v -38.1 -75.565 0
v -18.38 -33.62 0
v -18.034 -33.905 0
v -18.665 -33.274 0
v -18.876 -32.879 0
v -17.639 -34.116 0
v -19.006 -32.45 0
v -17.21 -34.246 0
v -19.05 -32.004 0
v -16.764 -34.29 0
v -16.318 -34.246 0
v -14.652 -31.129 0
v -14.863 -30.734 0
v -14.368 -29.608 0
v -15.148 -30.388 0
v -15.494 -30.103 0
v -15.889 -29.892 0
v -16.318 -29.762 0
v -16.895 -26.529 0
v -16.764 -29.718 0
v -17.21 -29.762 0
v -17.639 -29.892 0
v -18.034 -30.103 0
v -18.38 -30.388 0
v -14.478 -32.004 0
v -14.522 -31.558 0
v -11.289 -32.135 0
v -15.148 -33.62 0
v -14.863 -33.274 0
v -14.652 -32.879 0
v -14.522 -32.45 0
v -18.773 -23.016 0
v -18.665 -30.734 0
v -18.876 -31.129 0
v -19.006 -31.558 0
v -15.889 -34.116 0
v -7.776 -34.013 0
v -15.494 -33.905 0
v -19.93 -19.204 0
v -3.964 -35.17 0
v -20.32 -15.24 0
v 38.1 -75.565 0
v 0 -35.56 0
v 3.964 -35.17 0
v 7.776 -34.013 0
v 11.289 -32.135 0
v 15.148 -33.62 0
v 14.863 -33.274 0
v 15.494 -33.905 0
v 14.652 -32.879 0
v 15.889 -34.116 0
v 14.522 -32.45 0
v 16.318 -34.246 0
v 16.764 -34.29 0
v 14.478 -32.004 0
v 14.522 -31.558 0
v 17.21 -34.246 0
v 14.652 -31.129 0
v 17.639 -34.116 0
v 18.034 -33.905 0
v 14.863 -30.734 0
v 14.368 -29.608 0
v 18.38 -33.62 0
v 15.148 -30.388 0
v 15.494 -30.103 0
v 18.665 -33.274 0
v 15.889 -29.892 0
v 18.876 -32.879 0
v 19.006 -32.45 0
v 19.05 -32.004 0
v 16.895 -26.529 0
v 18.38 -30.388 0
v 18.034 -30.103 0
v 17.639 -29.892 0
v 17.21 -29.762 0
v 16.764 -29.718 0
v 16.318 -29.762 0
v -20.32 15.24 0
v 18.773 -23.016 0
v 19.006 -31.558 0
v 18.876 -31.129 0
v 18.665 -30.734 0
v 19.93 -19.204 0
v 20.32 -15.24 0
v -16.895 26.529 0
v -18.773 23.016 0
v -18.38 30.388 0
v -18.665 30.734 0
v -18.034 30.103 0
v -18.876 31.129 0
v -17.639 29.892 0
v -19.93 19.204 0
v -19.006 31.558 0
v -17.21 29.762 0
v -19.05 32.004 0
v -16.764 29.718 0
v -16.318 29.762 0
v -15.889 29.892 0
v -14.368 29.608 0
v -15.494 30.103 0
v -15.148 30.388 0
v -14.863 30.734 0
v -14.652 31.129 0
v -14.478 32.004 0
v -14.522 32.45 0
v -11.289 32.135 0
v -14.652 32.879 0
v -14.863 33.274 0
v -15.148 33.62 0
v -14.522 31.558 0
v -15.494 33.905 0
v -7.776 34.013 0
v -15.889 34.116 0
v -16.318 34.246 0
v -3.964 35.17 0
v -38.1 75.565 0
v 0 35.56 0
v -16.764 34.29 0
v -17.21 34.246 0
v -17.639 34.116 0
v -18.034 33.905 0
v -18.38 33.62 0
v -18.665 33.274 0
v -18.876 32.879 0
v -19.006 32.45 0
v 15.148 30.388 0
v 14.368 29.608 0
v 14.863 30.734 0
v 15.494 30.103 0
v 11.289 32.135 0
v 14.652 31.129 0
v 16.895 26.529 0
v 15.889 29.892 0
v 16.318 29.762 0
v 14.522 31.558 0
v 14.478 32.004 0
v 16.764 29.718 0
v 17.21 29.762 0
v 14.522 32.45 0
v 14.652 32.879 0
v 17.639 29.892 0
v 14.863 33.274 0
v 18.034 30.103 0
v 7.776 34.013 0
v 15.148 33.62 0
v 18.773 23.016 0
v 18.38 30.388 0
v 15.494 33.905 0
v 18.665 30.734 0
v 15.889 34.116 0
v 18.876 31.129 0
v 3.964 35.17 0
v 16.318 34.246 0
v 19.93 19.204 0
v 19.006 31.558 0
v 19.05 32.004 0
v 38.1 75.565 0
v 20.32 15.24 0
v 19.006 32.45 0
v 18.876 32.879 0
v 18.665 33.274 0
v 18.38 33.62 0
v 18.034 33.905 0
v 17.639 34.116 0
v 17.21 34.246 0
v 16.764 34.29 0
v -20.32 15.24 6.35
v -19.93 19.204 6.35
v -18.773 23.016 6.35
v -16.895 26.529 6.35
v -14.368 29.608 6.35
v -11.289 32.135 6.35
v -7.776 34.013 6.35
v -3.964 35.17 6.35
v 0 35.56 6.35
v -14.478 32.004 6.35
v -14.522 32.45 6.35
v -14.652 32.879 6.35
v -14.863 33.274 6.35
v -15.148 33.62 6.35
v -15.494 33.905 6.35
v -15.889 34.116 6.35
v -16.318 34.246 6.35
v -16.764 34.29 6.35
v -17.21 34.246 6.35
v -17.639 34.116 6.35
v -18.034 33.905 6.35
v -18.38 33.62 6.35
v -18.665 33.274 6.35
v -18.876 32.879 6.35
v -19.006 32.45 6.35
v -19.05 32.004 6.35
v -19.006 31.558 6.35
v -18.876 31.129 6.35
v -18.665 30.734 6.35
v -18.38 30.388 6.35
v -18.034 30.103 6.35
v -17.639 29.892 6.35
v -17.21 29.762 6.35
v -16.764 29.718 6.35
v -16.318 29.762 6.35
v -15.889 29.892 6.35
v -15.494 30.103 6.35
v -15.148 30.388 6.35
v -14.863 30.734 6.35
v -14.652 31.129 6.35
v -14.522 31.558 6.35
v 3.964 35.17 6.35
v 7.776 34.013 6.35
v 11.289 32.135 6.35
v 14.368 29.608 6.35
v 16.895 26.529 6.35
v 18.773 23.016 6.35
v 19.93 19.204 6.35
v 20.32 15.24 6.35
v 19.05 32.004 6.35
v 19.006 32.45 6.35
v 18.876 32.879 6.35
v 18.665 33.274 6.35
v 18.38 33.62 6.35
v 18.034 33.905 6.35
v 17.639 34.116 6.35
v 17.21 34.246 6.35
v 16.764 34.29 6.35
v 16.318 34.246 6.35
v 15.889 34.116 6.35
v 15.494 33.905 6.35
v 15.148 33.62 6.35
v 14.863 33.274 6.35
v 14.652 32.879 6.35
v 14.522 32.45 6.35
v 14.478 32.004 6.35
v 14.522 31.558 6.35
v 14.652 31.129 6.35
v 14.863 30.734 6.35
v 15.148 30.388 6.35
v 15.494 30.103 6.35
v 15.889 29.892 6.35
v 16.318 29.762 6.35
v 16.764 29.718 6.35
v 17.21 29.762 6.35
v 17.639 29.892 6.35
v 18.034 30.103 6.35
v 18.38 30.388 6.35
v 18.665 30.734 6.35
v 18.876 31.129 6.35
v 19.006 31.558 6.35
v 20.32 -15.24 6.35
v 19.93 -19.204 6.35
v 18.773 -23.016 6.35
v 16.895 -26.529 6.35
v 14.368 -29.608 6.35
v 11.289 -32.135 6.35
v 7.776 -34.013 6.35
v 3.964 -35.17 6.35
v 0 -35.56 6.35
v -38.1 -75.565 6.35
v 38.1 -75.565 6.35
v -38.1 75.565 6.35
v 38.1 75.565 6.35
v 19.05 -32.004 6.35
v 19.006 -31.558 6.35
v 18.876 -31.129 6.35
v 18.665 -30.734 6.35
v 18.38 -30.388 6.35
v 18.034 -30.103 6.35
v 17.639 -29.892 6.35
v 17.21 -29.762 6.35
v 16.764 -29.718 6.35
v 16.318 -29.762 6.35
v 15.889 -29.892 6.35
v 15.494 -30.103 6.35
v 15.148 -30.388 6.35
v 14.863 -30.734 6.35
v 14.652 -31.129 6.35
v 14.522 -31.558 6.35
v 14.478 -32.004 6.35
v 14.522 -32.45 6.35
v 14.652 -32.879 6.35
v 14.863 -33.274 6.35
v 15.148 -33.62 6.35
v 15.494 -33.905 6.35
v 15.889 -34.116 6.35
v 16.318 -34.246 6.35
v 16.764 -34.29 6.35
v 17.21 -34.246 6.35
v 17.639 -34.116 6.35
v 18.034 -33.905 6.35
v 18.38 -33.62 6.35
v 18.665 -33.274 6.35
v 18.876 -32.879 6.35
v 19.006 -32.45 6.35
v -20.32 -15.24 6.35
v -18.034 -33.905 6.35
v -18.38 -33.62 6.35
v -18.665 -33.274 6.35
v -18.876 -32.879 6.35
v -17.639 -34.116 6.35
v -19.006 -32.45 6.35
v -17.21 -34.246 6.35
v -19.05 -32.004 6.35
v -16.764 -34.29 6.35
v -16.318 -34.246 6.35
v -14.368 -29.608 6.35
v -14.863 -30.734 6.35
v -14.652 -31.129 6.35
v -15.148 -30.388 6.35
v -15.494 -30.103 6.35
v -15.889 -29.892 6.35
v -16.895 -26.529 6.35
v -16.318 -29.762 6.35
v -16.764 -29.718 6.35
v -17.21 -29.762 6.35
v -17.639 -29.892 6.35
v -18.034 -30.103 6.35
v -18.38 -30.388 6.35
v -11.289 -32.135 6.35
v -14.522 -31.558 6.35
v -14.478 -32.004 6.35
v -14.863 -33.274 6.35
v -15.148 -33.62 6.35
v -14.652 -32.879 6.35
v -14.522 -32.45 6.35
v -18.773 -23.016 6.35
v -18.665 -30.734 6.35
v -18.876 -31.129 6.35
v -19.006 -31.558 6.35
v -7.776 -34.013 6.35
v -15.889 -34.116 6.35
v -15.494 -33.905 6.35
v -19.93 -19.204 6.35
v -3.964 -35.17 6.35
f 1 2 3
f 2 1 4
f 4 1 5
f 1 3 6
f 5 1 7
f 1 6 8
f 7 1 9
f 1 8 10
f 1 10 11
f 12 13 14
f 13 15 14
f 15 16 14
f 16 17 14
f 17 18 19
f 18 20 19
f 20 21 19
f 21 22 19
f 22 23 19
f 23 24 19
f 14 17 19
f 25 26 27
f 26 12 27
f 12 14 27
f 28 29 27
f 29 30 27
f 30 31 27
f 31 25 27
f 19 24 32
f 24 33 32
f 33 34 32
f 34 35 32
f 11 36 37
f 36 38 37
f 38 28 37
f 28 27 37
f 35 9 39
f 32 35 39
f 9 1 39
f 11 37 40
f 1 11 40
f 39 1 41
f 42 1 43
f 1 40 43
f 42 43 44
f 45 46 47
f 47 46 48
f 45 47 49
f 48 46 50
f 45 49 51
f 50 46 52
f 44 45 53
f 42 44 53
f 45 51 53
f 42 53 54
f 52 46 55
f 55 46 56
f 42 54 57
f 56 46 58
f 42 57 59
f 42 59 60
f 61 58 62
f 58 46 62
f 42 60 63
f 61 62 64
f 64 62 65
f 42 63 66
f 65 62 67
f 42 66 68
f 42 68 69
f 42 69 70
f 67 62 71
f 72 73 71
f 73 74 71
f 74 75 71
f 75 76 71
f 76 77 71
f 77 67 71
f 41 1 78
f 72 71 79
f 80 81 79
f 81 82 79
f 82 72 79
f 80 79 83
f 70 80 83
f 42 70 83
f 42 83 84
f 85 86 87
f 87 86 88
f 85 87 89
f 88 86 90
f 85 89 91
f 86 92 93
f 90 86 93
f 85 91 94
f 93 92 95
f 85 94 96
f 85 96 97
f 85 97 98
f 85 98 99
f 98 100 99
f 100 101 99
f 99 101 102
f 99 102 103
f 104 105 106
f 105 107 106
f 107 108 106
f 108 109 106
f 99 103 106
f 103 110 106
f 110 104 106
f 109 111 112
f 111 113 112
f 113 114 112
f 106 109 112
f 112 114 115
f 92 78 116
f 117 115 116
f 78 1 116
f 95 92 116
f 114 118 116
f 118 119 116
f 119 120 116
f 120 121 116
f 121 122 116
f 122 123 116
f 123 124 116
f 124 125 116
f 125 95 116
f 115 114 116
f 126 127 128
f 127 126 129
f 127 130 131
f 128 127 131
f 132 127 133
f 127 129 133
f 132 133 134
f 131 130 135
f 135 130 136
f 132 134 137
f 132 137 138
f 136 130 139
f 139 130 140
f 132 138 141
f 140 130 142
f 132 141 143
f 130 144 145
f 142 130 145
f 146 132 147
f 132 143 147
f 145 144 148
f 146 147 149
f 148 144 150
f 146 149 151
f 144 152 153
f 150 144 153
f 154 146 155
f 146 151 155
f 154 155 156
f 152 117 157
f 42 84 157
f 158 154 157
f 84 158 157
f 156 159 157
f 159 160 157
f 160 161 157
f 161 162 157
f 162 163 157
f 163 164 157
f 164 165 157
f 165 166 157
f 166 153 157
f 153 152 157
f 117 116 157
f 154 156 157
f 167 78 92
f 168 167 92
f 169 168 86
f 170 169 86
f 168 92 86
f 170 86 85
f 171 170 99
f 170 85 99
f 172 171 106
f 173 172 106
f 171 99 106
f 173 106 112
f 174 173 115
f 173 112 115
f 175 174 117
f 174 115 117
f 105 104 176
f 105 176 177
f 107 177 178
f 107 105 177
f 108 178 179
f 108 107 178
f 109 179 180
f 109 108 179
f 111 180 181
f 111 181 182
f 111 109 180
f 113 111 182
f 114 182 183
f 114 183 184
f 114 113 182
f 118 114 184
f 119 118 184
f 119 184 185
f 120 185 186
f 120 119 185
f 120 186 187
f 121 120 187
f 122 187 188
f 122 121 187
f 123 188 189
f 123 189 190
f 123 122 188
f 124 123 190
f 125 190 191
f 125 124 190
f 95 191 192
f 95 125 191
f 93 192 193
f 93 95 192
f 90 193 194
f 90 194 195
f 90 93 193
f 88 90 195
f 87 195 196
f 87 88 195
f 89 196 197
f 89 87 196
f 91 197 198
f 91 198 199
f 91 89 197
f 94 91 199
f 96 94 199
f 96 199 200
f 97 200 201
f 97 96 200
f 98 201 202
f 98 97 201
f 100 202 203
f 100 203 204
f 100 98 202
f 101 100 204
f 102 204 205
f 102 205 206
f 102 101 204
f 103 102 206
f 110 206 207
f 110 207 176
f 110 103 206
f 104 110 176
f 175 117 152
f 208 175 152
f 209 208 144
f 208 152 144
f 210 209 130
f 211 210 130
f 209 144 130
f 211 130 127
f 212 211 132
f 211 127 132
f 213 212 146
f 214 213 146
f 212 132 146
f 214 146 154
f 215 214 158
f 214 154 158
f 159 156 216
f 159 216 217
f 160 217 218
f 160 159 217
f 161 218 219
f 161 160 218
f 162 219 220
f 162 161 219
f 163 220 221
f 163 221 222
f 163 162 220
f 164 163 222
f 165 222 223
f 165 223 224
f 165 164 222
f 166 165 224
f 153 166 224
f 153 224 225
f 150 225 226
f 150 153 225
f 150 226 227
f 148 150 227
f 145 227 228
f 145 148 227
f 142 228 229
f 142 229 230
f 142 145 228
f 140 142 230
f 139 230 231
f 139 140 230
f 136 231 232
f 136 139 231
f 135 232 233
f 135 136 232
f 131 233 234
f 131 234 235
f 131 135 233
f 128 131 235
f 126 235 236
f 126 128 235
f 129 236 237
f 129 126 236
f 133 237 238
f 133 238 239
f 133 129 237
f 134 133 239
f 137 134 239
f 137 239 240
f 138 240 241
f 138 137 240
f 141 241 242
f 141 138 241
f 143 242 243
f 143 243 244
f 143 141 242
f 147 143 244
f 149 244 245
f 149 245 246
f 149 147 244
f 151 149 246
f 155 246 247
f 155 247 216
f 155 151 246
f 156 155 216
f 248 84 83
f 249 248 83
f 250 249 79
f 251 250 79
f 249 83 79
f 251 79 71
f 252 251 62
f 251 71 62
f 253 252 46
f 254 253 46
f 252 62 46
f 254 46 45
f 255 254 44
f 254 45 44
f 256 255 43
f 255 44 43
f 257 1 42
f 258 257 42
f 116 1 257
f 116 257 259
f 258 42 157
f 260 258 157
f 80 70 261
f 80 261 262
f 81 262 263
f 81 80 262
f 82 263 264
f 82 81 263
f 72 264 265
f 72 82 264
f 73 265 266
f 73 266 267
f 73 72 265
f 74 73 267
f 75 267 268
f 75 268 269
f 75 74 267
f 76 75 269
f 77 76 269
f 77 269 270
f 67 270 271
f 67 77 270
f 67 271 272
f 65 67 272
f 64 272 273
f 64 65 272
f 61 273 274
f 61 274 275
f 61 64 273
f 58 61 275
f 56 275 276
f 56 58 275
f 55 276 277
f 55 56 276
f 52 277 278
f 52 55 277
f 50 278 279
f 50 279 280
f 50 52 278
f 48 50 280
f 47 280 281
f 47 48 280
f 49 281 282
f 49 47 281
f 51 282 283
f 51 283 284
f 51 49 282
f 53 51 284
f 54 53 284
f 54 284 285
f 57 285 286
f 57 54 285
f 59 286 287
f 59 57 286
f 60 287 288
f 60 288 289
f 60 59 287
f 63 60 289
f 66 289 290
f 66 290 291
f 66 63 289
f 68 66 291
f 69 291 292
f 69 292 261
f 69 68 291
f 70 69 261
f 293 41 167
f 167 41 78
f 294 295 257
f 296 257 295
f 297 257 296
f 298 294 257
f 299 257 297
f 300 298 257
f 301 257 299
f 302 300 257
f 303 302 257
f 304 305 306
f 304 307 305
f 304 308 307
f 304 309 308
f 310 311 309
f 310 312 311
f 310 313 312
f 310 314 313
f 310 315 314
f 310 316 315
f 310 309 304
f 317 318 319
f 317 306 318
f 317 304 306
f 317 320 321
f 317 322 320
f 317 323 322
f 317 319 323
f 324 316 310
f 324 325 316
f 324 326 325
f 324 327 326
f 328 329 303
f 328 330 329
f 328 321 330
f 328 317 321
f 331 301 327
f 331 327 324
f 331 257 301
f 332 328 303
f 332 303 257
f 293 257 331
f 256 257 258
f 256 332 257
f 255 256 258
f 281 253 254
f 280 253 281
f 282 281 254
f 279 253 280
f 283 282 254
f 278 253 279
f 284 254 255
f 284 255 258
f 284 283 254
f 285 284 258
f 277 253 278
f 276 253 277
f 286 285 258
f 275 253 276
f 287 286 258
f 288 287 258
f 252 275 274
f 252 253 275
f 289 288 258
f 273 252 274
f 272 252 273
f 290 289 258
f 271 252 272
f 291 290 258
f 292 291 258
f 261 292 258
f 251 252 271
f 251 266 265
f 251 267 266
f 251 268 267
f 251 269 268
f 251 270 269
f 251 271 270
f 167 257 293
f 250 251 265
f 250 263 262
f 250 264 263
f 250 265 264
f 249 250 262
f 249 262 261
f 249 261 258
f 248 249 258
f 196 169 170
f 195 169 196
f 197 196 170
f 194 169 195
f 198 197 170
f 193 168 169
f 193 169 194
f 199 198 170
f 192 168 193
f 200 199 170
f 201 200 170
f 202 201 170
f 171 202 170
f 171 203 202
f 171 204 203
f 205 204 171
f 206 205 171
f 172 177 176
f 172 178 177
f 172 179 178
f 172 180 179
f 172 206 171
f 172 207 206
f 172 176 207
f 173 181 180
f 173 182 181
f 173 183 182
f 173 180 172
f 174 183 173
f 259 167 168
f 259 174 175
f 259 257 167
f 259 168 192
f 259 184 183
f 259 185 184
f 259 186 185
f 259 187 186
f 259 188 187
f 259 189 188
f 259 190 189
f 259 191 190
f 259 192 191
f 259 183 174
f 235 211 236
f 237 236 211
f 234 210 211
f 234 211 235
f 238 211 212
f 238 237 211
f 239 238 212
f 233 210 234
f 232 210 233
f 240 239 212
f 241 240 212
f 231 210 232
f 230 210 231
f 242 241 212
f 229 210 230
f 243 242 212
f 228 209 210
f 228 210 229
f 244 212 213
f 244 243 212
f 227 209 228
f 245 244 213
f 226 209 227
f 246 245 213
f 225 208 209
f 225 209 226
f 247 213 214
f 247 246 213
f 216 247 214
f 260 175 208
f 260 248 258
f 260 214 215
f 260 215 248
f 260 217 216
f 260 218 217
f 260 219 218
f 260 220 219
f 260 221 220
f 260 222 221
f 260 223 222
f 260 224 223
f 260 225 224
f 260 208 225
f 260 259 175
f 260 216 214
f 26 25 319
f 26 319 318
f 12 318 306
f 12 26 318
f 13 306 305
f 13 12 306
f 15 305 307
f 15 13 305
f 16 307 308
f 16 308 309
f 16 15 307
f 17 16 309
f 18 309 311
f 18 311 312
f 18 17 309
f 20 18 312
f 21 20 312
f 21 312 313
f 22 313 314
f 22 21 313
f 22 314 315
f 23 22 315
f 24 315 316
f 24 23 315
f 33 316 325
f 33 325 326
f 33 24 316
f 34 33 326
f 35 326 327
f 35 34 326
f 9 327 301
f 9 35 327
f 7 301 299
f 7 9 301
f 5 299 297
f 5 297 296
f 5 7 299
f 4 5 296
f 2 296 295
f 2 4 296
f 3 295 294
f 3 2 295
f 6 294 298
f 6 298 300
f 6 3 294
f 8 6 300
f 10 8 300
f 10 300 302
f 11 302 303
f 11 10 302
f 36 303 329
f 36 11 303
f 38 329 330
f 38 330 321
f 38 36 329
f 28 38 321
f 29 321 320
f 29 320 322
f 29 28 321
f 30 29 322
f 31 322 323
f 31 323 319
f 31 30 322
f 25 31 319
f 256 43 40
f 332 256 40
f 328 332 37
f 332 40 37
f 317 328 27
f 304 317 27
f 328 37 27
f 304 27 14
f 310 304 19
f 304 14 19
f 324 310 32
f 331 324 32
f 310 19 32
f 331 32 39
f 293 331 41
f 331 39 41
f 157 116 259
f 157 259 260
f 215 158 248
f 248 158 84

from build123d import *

# Parameters (mm, degrees)
F0_W     = 76.2
F0_H     = 151.13
F0_R     = 2.286
F1_DEPTH = 6.35


with BuildPart() as f1:
    # F0 (on Top) → F1 (new body)
    with BuildSketch(Plane.XY):
        Rectangle(F0_W, F0_H)
        Polygon((0, 35.56), (20.32, 35.56), (20.32, 15.24), (20.32, -15.24), (20.32, -35.56), (0, -35.56), (-20.32, -35.56), (-20.32, -15.24), (-20.32, 15.24), (-20.32, 35.56), align=None, mode=Mode.SUBTRACT)
        with BuildLine():
            ThreePointArc((0, -35.56), (-14.36841, -29.60841), (-20.32, -15.24))
            Line((-20.32, -15.24), (-20.32, -35.56))
            Line((-20.32, -35.56), (0, -35.56))
        make_face()
        with Locations((-16.764, -32.004)):
            Circle(F0_R, mode=Mode.SUBTRACT)
        with BuildLine():
            Line((20.32, -35.56), (20.32, -15.24))
            ThreePointArc((20.32, -15.24), (14.36841, -29.60841), (0, -35.56))
            Line((0, -35.56), (20.32, -35.56))
        make_face()
        with Locations((16.764, -32.004)):
            Circle(F0_R, mode=Mode.SUBTRACT)
        with BuildLine():
            ThreePointArc((-20.32, 15.24), (-14.36841, 29.60841), (0, 35.56))
            Line((0, 35.56), (-20.32, 35.56))
            Line((-20.32, 35.56), (-20.32, 15.24))
        make_face()
        with Locations((-16.764, 32.004)):
            Circle(F0_R, mode=Mode.SUBTRACT)
        with BuildLine():
            Line((20.32, 15.24), (20.32, 35.56))
            Line((20.32, 35.56), (0, 35.56))
            ThreePointArc((0, 35.56), (14.36841, 29.60841), (20.32, 15.24))
        make_face()
        with Locations((16.764, 32.004)):
            Circle(F0_R, mode=Mode.SUBTRACT)
    extrude(amount=F1_DEPTH)


solid = f1.part
